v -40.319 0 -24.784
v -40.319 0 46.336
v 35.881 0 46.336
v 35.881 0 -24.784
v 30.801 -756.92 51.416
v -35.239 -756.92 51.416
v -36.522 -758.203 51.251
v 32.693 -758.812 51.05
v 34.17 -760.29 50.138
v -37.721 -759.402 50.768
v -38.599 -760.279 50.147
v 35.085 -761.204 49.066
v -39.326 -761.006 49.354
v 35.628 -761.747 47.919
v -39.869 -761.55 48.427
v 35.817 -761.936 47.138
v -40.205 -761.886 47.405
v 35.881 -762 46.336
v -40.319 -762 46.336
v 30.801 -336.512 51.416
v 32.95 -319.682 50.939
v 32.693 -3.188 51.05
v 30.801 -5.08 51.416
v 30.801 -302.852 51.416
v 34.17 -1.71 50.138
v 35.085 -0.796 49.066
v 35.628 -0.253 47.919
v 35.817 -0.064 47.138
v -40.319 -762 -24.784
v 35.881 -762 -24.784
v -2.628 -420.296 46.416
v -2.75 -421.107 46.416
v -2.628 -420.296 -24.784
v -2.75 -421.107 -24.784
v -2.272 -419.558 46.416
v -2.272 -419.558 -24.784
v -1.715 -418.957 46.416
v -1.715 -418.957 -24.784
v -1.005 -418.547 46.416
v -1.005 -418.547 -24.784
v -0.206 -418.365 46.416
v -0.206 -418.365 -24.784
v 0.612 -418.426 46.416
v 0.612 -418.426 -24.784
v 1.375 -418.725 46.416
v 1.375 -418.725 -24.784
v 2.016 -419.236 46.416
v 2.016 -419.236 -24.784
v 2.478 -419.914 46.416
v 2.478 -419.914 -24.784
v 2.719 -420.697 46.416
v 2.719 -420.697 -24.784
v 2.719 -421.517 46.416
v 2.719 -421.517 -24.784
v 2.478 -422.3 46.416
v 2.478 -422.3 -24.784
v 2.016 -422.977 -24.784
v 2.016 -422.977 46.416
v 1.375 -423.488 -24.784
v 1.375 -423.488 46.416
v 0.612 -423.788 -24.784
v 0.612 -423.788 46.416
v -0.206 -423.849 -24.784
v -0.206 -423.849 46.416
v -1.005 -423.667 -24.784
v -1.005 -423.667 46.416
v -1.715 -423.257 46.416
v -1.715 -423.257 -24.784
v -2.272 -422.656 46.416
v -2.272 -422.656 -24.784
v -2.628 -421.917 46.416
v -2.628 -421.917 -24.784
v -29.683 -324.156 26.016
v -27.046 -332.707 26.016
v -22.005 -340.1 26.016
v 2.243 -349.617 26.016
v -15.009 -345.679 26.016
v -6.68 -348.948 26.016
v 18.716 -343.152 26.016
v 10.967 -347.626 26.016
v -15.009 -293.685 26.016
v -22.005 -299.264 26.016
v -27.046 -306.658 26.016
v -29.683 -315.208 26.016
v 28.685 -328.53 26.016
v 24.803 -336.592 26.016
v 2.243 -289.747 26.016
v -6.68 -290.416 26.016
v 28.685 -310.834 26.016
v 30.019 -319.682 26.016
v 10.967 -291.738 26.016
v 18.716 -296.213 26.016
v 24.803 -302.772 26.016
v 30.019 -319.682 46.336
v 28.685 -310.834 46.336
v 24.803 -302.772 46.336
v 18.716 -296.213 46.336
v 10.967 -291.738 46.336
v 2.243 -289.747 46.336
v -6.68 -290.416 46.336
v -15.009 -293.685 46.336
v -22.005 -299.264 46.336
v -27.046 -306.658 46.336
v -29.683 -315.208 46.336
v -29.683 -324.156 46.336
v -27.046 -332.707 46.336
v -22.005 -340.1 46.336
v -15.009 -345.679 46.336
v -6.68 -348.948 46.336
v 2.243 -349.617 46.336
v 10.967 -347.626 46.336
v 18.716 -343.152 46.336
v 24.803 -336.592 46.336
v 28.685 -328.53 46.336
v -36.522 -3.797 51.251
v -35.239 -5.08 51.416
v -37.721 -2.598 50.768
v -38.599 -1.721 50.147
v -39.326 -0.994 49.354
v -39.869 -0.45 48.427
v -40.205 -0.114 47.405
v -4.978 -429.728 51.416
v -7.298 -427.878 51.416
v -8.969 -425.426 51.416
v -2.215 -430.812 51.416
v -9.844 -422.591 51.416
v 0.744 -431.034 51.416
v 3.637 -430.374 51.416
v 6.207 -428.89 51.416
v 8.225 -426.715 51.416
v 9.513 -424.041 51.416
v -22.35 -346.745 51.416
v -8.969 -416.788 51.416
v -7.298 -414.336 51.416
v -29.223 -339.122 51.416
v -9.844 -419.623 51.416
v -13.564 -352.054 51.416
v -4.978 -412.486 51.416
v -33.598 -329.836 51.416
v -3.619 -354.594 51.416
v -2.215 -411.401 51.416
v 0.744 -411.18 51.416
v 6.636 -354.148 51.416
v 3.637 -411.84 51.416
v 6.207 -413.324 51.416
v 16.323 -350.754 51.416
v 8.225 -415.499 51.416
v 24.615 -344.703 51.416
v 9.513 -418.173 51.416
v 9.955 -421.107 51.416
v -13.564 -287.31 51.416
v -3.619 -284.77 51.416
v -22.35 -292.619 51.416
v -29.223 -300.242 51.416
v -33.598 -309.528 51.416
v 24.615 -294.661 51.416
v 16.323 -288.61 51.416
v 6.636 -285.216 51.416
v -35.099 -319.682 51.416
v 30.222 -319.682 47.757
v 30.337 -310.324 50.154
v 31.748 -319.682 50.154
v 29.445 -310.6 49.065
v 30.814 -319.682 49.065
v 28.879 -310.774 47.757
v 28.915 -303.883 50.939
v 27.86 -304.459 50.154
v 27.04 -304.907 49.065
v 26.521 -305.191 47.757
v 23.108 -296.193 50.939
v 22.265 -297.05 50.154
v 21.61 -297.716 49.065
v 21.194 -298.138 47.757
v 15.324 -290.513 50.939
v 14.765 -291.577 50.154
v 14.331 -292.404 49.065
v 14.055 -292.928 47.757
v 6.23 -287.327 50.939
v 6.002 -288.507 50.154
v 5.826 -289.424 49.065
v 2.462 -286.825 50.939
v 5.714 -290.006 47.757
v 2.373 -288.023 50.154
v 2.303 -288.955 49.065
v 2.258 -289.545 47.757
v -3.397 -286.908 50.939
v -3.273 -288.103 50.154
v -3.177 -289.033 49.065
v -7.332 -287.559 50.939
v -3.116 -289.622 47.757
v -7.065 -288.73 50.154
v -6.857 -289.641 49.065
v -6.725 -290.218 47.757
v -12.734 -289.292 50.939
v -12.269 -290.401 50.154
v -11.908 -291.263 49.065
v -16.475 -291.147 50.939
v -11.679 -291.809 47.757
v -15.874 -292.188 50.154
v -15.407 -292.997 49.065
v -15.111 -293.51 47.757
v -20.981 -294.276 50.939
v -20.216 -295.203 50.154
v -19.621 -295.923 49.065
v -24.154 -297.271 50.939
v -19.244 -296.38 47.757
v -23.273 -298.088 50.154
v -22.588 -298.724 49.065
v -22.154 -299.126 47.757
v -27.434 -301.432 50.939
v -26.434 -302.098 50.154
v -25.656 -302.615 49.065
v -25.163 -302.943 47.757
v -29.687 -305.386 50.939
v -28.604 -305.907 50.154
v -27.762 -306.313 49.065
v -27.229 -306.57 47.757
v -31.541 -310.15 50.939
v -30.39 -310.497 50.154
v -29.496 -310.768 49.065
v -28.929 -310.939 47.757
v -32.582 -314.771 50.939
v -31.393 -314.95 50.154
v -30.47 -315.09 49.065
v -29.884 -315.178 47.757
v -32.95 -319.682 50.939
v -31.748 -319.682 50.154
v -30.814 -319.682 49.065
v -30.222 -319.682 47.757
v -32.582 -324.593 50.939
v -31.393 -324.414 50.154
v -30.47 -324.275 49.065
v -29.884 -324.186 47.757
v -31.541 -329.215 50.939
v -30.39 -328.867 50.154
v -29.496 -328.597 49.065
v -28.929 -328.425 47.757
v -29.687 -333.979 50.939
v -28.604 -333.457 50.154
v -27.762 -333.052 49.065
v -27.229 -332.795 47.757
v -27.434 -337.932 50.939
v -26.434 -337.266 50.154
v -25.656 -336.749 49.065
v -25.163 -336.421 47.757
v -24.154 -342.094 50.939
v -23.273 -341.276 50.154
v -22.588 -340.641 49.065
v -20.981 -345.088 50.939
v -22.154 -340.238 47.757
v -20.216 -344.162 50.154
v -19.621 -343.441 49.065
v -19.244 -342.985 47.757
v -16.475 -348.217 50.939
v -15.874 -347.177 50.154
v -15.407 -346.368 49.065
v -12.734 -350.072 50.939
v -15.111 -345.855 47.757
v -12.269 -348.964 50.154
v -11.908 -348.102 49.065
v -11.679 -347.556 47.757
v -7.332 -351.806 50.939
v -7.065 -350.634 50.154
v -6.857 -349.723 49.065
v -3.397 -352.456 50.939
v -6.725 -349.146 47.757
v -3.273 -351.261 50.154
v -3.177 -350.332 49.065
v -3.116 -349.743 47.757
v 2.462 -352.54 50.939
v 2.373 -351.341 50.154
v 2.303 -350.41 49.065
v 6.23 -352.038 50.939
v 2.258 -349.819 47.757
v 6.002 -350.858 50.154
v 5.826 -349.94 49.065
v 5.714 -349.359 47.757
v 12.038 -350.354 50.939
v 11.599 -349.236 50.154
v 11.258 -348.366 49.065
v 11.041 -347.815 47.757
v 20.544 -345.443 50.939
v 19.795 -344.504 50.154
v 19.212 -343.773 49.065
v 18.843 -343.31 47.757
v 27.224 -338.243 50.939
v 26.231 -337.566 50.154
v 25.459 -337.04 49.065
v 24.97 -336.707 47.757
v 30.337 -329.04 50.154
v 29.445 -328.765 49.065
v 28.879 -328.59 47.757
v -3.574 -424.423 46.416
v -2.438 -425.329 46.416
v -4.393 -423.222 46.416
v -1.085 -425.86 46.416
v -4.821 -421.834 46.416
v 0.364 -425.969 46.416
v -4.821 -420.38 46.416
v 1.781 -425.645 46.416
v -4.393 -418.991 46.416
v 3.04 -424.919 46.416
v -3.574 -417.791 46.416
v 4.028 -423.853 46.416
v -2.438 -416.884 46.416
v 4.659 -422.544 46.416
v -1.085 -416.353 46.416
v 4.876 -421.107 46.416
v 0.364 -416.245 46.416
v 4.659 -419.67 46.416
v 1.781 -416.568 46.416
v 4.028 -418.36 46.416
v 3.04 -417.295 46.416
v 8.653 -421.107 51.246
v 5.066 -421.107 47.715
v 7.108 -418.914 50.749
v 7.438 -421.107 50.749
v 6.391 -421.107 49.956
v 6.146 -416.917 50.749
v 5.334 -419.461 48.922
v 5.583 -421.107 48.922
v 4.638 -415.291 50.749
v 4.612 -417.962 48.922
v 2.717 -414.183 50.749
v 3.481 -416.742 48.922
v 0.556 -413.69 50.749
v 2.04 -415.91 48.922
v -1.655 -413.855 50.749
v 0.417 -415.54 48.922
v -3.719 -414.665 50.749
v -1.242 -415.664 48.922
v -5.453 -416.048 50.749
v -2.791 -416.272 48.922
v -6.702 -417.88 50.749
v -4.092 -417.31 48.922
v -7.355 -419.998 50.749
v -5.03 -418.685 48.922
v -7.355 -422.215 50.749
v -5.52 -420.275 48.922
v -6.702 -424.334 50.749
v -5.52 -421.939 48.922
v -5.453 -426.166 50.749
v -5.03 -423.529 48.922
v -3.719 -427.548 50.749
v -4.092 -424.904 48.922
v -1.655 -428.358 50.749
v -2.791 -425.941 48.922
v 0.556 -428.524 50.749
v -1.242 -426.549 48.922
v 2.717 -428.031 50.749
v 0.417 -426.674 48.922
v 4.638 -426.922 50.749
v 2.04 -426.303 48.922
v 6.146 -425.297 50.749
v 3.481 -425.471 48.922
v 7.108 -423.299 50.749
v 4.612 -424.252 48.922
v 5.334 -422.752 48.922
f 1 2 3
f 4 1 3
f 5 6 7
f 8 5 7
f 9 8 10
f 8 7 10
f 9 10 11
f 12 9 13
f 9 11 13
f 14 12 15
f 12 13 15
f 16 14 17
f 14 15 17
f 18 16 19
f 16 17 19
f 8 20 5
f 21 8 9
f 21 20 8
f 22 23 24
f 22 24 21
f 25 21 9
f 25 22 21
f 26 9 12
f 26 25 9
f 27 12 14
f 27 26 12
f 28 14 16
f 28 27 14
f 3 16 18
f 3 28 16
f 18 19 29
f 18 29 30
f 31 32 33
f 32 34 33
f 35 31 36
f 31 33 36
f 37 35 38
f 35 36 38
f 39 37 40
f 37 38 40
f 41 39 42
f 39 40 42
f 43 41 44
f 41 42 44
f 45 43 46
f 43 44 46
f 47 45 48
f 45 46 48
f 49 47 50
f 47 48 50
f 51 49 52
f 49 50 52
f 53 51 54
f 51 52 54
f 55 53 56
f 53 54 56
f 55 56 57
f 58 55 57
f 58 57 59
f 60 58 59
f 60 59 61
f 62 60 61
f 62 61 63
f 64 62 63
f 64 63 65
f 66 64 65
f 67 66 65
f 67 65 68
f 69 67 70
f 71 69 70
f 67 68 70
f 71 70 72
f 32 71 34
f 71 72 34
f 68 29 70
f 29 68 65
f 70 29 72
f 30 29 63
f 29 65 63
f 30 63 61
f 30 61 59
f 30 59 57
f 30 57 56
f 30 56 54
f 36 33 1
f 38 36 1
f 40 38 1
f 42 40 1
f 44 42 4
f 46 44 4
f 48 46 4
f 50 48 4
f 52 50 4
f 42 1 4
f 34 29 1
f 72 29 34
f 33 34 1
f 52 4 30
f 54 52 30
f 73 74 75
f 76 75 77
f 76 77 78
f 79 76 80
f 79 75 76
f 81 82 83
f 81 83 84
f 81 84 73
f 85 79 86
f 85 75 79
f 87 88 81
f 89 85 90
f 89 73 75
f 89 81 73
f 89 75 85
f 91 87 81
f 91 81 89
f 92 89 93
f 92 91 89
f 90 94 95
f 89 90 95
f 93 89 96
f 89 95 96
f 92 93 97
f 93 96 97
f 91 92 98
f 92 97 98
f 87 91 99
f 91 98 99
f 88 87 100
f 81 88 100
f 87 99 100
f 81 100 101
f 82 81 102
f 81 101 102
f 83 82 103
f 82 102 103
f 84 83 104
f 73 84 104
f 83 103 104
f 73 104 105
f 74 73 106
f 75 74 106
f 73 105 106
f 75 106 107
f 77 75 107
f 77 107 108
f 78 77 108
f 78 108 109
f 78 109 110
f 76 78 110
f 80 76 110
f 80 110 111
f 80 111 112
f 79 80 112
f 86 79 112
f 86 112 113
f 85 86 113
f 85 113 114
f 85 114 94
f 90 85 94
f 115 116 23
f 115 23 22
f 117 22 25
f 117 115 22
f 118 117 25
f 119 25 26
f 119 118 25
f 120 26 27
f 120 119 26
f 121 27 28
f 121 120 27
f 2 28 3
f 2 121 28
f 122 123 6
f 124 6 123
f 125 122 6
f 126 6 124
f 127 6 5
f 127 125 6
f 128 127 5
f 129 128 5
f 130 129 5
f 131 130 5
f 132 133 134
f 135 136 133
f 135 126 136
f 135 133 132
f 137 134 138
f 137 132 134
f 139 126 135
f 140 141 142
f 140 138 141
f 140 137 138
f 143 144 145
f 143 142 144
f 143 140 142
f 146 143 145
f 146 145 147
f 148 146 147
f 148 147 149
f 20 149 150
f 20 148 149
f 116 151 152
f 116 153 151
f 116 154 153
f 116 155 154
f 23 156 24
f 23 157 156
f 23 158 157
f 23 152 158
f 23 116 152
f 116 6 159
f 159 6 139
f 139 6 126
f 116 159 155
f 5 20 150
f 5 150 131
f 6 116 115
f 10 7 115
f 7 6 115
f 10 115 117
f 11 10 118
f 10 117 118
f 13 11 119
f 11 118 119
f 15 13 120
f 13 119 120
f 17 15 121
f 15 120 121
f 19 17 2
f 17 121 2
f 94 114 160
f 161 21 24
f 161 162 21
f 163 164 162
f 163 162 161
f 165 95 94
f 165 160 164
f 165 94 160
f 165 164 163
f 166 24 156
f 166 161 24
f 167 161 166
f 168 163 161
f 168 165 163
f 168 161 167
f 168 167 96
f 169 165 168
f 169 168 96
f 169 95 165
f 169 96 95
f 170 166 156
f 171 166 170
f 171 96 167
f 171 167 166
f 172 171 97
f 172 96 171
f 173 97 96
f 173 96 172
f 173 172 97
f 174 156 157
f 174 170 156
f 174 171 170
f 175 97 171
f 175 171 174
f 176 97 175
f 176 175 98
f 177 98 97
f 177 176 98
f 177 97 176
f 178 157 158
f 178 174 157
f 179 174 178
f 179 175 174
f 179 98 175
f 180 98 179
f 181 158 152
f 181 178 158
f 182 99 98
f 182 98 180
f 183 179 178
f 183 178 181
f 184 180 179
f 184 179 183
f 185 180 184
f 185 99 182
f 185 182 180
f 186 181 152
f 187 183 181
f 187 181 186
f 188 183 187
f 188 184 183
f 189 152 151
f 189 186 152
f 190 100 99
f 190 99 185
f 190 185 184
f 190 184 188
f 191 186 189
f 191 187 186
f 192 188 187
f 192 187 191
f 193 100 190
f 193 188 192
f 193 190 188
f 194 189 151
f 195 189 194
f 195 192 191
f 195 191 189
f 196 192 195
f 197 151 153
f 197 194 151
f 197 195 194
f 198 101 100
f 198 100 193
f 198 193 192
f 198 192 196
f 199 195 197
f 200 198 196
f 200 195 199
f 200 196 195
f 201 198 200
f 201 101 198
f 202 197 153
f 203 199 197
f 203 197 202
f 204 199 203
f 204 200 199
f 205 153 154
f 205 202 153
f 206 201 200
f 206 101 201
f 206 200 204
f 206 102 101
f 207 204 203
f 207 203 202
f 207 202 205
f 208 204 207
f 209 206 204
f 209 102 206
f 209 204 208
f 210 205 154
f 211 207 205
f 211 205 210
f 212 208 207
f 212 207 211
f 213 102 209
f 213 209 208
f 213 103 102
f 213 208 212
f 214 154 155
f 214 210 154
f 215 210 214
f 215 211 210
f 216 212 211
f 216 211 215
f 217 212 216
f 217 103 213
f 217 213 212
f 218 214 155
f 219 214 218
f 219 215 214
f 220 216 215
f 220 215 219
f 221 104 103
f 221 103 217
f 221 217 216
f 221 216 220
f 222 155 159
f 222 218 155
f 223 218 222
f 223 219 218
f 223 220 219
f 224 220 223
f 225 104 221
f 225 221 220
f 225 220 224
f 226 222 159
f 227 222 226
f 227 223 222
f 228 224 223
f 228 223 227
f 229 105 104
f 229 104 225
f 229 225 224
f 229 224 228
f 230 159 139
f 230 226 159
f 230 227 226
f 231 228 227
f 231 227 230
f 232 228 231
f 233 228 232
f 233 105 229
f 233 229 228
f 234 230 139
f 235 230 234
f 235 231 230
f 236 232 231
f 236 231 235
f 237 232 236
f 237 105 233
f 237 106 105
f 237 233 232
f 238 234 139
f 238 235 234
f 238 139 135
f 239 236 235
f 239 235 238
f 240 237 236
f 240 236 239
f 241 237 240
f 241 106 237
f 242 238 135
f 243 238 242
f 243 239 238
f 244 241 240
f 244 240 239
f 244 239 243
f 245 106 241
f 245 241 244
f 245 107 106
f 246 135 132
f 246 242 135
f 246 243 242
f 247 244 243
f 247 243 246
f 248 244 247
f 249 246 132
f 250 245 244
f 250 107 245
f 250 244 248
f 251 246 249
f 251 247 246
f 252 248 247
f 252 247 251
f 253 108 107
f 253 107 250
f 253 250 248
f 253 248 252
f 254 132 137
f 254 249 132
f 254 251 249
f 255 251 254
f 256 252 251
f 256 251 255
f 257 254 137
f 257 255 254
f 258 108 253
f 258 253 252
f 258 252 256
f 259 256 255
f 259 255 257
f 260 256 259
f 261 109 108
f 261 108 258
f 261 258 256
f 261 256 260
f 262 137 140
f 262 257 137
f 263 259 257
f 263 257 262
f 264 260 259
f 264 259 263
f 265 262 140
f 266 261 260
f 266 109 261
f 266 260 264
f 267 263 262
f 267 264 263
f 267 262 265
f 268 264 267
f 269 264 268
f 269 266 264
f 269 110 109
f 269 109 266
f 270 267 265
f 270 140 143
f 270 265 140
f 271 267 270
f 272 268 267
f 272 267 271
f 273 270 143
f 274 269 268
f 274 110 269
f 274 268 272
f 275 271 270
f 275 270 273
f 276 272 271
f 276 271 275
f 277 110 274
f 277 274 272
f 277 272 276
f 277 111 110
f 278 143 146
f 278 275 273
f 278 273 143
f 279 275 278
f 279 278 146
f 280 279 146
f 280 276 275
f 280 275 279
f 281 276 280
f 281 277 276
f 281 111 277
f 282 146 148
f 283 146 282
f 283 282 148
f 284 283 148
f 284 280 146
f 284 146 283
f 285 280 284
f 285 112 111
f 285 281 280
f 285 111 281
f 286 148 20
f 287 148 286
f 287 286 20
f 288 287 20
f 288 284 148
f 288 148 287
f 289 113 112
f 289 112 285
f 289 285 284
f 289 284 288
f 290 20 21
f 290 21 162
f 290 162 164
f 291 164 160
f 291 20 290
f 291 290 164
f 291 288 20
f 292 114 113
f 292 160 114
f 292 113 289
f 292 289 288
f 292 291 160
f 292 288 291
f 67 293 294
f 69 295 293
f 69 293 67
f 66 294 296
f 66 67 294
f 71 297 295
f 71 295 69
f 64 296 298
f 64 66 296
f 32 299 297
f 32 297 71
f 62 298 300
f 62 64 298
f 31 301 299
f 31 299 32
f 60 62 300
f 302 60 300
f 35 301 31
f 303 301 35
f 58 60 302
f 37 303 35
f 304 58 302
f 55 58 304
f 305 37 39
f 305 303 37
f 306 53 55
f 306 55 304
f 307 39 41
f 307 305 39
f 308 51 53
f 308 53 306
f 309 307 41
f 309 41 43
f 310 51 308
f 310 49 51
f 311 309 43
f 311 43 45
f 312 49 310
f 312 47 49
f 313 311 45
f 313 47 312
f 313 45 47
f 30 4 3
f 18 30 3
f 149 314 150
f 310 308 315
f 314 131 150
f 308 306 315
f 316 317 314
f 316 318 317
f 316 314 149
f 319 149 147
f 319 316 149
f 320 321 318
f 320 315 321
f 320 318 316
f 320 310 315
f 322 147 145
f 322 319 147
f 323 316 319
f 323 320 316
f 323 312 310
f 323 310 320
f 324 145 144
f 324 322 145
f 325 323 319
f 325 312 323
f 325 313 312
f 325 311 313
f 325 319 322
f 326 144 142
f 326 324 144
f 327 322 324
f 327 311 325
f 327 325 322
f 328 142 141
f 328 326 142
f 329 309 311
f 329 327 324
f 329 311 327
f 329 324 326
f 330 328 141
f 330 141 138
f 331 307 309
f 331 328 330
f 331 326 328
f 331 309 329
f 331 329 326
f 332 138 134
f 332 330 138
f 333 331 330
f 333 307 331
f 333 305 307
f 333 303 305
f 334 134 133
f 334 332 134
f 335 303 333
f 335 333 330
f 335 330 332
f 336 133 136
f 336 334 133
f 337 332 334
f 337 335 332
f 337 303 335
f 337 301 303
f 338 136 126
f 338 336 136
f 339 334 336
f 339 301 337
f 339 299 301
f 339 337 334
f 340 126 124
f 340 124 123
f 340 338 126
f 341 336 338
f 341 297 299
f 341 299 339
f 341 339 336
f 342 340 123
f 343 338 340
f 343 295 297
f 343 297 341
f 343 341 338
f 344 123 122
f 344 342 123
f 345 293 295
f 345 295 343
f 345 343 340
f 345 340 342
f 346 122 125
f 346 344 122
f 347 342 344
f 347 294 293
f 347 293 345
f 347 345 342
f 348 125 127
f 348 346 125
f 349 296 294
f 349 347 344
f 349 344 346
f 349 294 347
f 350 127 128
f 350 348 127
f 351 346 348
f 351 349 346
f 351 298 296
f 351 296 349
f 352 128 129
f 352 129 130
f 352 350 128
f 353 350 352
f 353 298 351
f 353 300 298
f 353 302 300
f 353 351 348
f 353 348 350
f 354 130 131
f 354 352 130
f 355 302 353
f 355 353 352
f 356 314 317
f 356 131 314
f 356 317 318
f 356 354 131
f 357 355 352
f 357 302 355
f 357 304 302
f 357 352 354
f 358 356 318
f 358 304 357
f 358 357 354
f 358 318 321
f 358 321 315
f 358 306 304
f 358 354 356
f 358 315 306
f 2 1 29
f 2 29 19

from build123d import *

# Parameters (mm, degrees)
F0_W           = 76.2
F0_H           = 76.2
F1_DEPTH       = 762
F3_D           = 5.5
F3_CBORE_D     = 9.75
F3_CBORE_DEPTH = 5
F4_R           = 30.0187668276
F5_DEPTH       = 25.4
F6_T1_DEPTH    = 787.4
F6_T3_DEPTH    = 101.6


# Not quite as in the source:
# - a fillet or chamfer that OpenCascade refuses, or shapes differently, is made with other operations: its cross-section is extruded or revolved along the edge and cut away or added


with BuildPart() as f1:
    # F0 (on Front) → F1 (new body)
    with BuildSketch(Plane.XZ):
        with Locations((-2.2192886099, 13.3160627689)):
            Rectangle(F0_W, F0_H)
    extrude(amount=F1_DEPTH)

    # F3 (through all)
    with Locations(Plane.XY.offset(51.4160627689)):
        with Locations((0, -421.1068451405)):
            CounterBoreHole(F3_D / 2, F3_CBORE_D / 2, F3_CBORE_DEPTH)

    # F4 (on face) → F5 (cut)
    with BuildSketch(Plane.XY.offset(51.4160627689)):
        with Locations((0, -319.6821808815)):
            Circle(F4_R)
    extrude(amount=-F5_DEPTH, mode=Mode.SUBTRACT)

    # F6: fillet of radius 5.08 on 6 edges, made by hand

    # F6_s2 → F6_t1 (cut)
    with BuildSketch(Plane.XZ.offset(-12.7)):
        with BuildLine():
            ThreePointArc((30.8007113901, 51.4160627689), (34.3928138385, 49.9281652174), (35.8807113901, 46.3360627689))
            Line((35.8807113901, 46.3360627689), (35.8807113901, 51.4160627689))
            Line((35.8807113901, 51.4160627689), (30.8007113901, 51.4160627689))
        make_face()
        with BuildLine():
            ThreePointArc((-35.2392886099, 51.4160627689), (-38.8313910583, 49.9281652174), (-40.3192886099, 46.3360627689))
            Line((-40.3192886099, 46.3360627689), (-40.3192886099, 51.4160627689))
            Line((-40.3192886099, 51.4160627689), (-35.2392886099, 51.4160627689))
        make_face()
    extrude(amount=F6_T1_DEPTH, mode=Mode.SUBTRACT)

    # F6_s4 → F6_t3 (cut)
    with BuildSketch(Plane.YZ.offset(-53.0192886099)):
        with BuildLine():
            ThreePointArc((-5.08, 51.4160627689), (-1.4878975516, 49.9281652174), (0, 46.3360627689))
            Line((0, 46.3360627689), (0, 51.4160627689))
            Line((0, 51.4160627689), (-5.08, 51.4160627689))
        make_face()
        with BuildLine():
            ThreePointArc((-756.92, 51.4160627689), (-760.5121024484, 49.9281652174), (-762, 46.3360627689))
            Line((-762, 46.3360627689), (-762, 51.4160627689))
            Line((-762, 51.4160627689), (-756.92, 51.4160627689))
        make_face()
    extrude(amount=F6_T3_DEPTH, mode=Mode.SUBTRACT)


with BuildPart() as f6_tool6:
    # F6_s7 → F6_t8 (revolve)
    with BuildSketch(Plane.XZ.offset(421.1068451405)):
        with BuildLine():
            ThreePointArc((9.955, 51.4160627689), (6.3628975516, 49.9281652174), (4.875, 46.3360627689))
            Line((4.875, 46.3360627689), (4.875, 51.4160627689))
            Line((4.875, 51.4160627689), (9.955, 51.4160627689))
        make_face()
    revolve(axis=Axis((0, -421.1068451405, 51.4160627689), (0, 0, 1)))

    split(bisect_by=Plane.XY.offset(46.4160627689), keep=Keep.TOP)


with BuildPart() as f1_1:
    add(f1.part)

    # F6_t5: cut F6_tool6
    add(f6_tool6.part, mode=Mode.SUBTRACT)

    # F6_s10 → F6_t11 (revolve, cut)
    with BuildSketch(Plane.XZ.offset(319.6821808815)):
        with BuildLine():
            ThreePointArc((35.0987668276, 51.4160627689), (31.5066643792, 49.9281652174), (30.0187668276, 46.3360627689))
            Line((30.0187668276, 46.3360627689), (30.0187668276, 51.4160627689))
            Line((30.0187668276, 51.4160627689), (35.0987668276, 51.4160627689))
        make_face()
    revolve(axis=Axis((0, -319.6821808815, 51.4160627689), (0, 0, 1)), mode=Mode.SUBTRACT)


solid = f1_1.part
